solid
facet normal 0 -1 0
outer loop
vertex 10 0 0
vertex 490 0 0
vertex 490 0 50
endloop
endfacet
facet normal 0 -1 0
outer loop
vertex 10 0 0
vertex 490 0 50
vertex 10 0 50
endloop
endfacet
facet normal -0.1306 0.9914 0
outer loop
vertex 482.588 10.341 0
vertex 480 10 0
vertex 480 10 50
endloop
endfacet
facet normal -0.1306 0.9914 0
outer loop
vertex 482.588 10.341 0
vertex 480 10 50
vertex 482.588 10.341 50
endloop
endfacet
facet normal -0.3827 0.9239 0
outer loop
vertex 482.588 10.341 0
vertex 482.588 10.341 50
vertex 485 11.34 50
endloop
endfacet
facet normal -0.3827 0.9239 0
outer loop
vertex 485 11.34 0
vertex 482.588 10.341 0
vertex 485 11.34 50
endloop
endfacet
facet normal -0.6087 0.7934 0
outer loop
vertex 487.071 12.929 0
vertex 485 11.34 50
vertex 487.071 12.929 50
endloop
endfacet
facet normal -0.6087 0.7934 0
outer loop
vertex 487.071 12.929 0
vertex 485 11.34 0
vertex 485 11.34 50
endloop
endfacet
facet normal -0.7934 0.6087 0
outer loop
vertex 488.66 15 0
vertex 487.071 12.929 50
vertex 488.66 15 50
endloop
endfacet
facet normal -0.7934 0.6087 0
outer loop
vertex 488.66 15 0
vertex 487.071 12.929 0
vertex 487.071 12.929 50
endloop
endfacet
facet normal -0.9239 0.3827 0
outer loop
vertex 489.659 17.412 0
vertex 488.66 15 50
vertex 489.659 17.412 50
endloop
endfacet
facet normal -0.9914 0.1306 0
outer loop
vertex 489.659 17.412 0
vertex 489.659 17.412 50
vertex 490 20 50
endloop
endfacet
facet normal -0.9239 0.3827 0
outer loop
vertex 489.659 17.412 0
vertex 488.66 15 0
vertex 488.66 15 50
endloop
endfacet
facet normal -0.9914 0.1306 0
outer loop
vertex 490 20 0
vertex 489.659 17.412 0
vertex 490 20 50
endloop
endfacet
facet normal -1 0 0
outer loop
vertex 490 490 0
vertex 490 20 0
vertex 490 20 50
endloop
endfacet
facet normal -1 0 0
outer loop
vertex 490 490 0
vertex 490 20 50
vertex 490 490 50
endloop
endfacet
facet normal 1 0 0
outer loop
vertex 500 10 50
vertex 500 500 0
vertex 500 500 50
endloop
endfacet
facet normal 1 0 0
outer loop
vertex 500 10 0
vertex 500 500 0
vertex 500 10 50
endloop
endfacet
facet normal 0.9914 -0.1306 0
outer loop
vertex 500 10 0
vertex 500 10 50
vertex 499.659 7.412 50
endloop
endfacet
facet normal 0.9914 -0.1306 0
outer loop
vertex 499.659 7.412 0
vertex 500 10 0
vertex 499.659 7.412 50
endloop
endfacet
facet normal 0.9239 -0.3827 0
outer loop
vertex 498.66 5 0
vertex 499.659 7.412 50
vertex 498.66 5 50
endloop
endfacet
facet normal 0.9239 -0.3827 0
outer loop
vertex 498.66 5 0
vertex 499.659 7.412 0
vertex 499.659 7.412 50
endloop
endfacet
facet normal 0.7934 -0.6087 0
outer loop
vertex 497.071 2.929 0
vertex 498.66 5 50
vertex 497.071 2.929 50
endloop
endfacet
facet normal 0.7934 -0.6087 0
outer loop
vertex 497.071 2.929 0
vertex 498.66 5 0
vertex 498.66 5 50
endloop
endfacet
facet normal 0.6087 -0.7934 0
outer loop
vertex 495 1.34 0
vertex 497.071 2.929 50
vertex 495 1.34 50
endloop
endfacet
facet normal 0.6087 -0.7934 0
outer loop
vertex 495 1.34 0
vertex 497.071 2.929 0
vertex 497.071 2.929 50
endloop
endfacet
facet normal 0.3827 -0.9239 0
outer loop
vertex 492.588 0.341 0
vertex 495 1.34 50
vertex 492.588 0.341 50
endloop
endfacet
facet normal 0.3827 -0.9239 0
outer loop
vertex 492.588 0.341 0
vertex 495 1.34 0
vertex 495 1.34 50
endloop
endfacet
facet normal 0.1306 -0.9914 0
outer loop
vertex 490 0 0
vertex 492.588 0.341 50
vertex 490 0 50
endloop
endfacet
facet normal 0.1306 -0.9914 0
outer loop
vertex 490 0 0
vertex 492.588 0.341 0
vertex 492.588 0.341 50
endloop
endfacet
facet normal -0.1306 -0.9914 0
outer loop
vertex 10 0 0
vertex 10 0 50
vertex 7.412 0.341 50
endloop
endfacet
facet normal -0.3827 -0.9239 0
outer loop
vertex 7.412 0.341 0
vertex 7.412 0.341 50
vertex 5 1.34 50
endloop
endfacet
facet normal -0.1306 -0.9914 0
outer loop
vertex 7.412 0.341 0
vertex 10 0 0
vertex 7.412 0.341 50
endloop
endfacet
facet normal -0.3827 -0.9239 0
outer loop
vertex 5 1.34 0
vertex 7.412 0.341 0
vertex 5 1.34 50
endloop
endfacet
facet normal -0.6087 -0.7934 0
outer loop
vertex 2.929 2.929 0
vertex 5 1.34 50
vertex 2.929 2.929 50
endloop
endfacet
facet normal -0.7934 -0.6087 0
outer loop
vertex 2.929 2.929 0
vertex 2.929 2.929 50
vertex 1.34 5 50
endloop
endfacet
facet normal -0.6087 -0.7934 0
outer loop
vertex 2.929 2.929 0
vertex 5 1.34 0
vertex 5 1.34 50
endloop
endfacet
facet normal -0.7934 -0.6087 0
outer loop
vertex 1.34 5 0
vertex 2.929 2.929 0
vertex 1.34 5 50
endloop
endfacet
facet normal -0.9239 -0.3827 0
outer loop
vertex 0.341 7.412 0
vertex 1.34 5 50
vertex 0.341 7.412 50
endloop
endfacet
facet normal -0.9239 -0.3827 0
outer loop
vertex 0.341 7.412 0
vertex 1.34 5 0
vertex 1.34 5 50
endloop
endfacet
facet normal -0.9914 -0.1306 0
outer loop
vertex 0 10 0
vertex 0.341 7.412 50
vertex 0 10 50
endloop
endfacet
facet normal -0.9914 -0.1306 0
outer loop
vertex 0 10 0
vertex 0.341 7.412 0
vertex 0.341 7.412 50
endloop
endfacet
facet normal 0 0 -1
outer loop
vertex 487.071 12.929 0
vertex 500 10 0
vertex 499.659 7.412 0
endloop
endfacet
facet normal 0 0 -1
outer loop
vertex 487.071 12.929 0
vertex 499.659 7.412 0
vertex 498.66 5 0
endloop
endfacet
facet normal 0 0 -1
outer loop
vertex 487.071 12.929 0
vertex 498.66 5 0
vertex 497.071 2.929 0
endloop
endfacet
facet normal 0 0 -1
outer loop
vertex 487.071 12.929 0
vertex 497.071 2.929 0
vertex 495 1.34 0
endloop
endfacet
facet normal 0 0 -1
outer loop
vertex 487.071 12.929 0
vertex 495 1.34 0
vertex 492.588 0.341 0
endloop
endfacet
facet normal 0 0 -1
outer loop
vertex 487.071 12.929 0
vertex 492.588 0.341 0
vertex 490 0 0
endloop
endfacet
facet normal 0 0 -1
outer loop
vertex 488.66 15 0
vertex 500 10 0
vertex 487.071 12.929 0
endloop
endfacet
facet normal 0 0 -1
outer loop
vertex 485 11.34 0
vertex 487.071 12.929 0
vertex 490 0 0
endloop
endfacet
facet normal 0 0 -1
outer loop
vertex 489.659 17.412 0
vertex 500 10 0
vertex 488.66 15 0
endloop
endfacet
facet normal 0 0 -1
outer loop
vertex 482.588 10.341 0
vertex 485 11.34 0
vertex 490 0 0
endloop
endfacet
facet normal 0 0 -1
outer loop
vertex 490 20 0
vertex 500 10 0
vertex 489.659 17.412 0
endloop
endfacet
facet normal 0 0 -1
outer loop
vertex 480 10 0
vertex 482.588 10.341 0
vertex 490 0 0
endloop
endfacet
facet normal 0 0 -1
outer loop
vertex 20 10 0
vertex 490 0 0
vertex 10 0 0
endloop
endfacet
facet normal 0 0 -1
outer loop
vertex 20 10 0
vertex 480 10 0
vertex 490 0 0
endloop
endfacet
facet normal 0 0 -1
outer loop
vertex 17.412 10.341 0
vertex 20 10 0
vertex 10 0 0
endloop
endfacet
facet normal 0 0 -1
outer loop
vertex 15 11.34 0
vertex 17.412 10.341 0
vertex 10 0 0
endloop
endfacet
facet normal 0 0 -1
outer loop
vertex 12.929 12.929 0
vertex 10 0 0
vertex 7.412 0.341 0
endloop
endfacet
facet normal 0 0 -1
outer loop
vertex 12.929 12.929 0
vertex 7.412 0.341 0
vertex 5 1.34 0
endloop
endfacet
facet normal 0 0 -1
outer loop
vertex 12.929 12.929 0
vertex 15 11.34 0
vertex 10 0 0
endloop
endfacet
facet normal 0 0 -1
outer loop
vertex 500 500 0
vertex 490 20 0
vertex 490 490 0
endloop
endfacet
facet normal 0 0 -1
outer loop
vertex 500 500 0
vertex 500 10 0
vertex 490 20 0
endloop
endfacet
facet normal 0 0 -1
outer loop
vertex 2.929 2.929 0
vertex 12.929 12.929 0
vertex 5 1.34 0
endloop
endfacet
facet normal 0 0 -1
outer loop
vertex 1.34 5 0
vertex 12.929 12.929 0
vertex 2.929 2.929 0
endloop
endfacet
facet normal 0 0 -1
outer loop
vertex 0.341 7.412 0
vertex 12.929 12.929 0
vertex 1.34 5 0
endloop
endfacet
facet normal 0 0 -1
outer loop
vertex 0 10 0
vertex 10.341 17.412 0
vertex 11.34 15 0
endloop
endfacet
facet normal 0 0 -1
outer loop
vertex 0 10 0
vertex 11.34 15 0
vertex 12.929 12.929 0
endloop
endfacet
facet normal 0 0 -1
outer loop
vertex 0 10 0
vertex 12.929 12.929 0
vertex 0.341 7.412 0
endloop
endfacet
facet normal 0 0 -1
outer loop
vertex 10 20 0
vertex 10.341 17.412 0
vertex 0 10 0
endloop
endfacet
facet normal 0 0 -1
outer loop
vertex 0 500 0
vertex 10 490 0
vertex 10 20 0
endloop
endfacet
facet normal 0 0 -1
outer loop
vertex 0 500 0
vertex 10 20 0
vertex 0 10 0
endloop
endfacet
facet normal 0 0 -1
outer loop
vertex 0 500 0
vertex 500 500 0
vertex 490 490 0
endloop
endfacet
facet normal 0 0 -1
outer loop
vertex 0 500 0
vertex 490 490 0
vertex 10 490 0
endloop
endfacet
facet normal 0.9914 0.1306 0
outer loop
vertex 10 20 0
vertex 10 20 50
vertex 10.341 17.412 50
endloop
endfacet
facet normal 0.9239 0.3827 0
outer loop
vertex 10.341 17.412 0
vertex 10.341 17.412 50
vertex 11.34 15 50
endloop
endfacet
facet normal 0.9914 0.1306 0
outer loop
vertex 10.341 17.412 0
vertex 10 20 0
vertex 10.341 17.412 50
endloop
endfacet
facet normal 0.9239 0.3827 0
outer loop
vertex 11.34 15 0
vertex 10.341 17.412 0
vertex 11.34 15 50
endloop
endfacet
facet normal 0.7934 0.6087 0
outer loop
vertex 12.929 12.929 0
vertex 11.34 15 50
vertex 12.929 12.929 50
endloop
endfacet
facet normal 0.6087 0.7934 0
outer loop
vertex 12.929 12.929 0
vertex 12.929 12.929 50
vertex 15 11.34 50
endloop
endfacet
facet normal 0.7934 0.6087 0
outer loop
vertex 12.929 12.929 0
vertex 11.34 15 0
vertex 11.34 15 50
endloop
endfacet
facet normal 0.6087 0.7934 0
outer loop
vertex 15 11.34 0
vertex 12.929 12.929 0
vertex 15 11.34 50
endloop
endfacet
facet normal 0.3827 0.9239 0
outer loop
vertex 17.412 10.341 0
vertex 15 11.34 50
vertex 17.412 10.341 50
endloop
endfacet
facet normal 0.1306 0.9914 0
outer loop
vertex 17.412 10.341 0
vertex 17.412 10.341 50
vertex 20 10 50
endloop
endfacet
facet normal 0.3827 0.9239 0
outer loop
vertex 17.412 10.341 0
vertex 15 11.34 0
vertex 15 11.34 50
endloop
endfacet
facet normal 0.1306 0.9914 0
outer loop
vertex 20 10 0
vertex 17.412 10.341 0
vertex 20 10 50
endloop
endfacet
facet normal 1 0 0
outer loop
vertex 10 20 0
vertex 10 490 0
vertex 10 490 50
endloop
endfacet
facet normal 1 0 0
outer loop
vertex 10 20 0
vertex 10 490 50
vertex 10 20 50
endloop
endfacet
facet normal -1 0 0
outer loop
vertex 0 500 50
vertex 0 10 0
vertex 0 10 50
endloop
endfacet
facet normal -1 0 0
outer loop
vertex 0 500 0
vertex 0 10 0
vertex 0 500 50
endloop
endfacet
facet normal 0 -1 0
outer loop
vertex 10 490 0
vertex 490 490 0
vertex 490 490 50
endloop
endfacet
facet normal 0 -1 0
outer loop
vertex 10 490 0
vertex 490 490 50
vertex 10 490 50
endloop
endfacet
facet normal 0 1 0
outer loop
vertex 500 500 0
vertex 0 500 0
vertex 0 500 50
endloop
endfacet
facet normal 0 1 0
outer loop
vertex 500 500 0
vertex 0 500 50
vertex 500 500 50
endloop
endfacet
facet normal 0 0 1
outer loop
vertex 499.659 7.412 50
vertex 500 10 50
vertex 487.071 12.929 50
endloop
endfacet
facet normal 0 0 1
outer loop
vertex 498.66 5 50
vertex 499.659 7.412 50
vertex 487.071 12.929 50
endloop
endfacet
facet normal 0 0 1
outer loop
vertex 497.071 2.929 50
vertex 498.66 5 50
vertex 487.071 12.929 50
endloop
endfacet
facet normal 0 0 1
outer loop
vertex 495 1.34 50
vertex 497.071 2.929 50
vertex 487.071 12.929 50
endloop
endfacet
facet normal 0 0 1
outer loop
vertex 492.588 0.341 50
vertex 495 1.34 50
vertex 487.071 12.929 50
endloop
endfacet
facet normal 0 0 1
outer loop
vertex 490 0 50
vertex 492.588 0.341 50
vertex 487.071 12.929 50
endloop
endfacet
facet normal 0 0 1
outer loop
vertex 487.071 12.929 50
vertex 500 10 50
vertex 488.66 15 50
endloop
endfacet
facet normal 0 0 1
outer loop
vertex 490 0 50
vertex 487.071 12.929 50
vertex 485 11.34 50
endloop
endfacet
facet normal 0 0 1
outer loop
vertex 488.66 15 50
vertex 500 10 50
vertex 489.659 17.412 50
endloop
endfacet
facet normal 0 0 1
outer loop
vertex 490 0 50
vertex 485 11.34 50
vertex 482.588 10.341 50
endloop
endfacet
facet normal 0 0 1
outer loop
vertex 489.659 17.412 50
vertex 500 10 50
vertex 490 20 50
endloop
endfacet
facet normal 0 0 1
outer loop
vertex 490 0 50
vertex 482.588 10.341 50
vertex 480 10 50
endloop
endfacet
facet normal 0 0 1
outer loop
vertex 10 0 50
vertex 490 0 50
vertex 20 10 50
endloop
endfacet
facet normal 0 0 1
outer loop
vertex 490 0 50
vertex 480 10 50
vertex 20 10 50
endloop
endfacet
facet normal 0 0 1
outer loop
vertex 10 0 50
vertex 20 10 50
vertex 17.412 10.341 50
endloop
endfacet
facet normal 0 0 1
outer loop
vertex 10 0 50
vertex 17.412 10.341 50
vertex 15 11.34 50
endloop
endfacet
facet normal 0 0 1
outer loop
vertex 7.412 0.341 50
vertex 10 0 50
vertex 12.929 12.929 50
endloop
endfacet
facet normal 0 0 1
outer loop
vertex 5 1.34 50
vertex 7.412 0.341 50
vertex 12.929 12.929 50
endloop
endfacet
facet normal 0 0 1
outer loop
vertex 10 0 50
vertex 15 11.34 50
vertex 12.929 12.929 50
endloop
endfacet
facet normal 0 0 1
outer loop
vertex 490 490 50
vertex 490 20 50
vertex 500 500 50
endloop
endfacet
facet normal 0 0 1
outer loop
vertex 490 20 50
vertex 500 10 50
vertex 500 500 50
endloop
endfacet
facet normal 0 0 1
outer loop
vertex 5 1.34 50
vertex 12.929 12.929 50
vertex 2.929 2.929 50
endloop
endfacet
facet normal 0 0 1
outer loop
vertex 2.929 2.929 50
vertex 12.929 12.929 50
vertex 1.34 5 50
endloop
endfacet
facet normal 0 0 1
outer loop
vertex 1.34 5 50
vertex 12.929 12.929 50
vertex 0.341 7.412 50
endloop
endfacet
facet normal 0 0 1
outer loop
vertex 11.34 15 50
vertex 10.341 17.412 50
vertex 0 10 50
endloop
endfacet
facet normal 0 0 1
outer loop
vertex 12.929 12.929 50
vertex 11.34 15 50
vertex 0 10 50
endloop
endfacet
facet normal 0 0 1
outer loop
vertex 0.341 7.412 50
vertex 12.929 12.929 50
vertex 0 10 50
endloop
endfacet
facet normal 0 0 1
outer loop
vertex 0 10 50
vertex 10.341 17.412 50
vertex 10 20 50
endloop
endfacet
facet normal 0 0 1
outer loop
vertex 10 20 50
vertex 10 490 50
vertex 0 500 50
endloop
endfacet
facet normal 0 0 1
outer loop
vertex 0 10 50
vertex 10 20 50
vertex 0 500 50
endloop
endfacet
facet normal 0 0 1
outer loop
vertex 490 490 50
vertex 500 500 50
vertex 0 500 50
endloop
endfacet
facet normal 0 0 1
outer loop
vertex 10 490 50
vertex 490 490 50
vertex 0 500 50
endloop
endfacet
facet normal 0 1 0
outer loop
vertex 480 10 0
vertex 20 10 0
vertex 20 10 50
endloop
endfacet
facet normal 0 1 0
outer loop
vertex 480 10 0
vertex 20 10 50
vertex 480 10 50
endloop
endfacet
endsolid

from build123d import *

# Parameters (mm, degrees)
SALIENTE_EXTRUIR1_DEPTH = 50


with BuildPart() as part:
    # Croquis2 → Saliente-Extruir1 (new body)
    with BuildSketch(Plane.XY):
        with BuildLine():
            Line((0, 10), (0, 500))
            Line((0, 500), (500, 500))
            Line((500, 500), (500, 10))
            ThreePointArc((500, 10), (497.071067812, 2.928932188), (490, 0))
            Line((490, 0), (10, 0))
            ThreePointArc((10, 0), (2.928932188, 2.928932188), (0, 10))
        make_face()
        with BuildLine():
            Line((10, 490), (10, 20))
            ThreePointArc((10, 20), (12.928932188, 12.928932188), (20, 10))
            Line((20, 10), (480, 10))
            ThreePointArc((480, 10), (487.071067812, 12.928932188), (490, 20))
            Line((490, 20), (490, 490))
            Line((490, 490), (10, 490))
        make_face(mode=Mode.SUBTRACT)
    extrude(amount=SALIENTE_EXTRUIR1_DEPTH)


solid = part.part
